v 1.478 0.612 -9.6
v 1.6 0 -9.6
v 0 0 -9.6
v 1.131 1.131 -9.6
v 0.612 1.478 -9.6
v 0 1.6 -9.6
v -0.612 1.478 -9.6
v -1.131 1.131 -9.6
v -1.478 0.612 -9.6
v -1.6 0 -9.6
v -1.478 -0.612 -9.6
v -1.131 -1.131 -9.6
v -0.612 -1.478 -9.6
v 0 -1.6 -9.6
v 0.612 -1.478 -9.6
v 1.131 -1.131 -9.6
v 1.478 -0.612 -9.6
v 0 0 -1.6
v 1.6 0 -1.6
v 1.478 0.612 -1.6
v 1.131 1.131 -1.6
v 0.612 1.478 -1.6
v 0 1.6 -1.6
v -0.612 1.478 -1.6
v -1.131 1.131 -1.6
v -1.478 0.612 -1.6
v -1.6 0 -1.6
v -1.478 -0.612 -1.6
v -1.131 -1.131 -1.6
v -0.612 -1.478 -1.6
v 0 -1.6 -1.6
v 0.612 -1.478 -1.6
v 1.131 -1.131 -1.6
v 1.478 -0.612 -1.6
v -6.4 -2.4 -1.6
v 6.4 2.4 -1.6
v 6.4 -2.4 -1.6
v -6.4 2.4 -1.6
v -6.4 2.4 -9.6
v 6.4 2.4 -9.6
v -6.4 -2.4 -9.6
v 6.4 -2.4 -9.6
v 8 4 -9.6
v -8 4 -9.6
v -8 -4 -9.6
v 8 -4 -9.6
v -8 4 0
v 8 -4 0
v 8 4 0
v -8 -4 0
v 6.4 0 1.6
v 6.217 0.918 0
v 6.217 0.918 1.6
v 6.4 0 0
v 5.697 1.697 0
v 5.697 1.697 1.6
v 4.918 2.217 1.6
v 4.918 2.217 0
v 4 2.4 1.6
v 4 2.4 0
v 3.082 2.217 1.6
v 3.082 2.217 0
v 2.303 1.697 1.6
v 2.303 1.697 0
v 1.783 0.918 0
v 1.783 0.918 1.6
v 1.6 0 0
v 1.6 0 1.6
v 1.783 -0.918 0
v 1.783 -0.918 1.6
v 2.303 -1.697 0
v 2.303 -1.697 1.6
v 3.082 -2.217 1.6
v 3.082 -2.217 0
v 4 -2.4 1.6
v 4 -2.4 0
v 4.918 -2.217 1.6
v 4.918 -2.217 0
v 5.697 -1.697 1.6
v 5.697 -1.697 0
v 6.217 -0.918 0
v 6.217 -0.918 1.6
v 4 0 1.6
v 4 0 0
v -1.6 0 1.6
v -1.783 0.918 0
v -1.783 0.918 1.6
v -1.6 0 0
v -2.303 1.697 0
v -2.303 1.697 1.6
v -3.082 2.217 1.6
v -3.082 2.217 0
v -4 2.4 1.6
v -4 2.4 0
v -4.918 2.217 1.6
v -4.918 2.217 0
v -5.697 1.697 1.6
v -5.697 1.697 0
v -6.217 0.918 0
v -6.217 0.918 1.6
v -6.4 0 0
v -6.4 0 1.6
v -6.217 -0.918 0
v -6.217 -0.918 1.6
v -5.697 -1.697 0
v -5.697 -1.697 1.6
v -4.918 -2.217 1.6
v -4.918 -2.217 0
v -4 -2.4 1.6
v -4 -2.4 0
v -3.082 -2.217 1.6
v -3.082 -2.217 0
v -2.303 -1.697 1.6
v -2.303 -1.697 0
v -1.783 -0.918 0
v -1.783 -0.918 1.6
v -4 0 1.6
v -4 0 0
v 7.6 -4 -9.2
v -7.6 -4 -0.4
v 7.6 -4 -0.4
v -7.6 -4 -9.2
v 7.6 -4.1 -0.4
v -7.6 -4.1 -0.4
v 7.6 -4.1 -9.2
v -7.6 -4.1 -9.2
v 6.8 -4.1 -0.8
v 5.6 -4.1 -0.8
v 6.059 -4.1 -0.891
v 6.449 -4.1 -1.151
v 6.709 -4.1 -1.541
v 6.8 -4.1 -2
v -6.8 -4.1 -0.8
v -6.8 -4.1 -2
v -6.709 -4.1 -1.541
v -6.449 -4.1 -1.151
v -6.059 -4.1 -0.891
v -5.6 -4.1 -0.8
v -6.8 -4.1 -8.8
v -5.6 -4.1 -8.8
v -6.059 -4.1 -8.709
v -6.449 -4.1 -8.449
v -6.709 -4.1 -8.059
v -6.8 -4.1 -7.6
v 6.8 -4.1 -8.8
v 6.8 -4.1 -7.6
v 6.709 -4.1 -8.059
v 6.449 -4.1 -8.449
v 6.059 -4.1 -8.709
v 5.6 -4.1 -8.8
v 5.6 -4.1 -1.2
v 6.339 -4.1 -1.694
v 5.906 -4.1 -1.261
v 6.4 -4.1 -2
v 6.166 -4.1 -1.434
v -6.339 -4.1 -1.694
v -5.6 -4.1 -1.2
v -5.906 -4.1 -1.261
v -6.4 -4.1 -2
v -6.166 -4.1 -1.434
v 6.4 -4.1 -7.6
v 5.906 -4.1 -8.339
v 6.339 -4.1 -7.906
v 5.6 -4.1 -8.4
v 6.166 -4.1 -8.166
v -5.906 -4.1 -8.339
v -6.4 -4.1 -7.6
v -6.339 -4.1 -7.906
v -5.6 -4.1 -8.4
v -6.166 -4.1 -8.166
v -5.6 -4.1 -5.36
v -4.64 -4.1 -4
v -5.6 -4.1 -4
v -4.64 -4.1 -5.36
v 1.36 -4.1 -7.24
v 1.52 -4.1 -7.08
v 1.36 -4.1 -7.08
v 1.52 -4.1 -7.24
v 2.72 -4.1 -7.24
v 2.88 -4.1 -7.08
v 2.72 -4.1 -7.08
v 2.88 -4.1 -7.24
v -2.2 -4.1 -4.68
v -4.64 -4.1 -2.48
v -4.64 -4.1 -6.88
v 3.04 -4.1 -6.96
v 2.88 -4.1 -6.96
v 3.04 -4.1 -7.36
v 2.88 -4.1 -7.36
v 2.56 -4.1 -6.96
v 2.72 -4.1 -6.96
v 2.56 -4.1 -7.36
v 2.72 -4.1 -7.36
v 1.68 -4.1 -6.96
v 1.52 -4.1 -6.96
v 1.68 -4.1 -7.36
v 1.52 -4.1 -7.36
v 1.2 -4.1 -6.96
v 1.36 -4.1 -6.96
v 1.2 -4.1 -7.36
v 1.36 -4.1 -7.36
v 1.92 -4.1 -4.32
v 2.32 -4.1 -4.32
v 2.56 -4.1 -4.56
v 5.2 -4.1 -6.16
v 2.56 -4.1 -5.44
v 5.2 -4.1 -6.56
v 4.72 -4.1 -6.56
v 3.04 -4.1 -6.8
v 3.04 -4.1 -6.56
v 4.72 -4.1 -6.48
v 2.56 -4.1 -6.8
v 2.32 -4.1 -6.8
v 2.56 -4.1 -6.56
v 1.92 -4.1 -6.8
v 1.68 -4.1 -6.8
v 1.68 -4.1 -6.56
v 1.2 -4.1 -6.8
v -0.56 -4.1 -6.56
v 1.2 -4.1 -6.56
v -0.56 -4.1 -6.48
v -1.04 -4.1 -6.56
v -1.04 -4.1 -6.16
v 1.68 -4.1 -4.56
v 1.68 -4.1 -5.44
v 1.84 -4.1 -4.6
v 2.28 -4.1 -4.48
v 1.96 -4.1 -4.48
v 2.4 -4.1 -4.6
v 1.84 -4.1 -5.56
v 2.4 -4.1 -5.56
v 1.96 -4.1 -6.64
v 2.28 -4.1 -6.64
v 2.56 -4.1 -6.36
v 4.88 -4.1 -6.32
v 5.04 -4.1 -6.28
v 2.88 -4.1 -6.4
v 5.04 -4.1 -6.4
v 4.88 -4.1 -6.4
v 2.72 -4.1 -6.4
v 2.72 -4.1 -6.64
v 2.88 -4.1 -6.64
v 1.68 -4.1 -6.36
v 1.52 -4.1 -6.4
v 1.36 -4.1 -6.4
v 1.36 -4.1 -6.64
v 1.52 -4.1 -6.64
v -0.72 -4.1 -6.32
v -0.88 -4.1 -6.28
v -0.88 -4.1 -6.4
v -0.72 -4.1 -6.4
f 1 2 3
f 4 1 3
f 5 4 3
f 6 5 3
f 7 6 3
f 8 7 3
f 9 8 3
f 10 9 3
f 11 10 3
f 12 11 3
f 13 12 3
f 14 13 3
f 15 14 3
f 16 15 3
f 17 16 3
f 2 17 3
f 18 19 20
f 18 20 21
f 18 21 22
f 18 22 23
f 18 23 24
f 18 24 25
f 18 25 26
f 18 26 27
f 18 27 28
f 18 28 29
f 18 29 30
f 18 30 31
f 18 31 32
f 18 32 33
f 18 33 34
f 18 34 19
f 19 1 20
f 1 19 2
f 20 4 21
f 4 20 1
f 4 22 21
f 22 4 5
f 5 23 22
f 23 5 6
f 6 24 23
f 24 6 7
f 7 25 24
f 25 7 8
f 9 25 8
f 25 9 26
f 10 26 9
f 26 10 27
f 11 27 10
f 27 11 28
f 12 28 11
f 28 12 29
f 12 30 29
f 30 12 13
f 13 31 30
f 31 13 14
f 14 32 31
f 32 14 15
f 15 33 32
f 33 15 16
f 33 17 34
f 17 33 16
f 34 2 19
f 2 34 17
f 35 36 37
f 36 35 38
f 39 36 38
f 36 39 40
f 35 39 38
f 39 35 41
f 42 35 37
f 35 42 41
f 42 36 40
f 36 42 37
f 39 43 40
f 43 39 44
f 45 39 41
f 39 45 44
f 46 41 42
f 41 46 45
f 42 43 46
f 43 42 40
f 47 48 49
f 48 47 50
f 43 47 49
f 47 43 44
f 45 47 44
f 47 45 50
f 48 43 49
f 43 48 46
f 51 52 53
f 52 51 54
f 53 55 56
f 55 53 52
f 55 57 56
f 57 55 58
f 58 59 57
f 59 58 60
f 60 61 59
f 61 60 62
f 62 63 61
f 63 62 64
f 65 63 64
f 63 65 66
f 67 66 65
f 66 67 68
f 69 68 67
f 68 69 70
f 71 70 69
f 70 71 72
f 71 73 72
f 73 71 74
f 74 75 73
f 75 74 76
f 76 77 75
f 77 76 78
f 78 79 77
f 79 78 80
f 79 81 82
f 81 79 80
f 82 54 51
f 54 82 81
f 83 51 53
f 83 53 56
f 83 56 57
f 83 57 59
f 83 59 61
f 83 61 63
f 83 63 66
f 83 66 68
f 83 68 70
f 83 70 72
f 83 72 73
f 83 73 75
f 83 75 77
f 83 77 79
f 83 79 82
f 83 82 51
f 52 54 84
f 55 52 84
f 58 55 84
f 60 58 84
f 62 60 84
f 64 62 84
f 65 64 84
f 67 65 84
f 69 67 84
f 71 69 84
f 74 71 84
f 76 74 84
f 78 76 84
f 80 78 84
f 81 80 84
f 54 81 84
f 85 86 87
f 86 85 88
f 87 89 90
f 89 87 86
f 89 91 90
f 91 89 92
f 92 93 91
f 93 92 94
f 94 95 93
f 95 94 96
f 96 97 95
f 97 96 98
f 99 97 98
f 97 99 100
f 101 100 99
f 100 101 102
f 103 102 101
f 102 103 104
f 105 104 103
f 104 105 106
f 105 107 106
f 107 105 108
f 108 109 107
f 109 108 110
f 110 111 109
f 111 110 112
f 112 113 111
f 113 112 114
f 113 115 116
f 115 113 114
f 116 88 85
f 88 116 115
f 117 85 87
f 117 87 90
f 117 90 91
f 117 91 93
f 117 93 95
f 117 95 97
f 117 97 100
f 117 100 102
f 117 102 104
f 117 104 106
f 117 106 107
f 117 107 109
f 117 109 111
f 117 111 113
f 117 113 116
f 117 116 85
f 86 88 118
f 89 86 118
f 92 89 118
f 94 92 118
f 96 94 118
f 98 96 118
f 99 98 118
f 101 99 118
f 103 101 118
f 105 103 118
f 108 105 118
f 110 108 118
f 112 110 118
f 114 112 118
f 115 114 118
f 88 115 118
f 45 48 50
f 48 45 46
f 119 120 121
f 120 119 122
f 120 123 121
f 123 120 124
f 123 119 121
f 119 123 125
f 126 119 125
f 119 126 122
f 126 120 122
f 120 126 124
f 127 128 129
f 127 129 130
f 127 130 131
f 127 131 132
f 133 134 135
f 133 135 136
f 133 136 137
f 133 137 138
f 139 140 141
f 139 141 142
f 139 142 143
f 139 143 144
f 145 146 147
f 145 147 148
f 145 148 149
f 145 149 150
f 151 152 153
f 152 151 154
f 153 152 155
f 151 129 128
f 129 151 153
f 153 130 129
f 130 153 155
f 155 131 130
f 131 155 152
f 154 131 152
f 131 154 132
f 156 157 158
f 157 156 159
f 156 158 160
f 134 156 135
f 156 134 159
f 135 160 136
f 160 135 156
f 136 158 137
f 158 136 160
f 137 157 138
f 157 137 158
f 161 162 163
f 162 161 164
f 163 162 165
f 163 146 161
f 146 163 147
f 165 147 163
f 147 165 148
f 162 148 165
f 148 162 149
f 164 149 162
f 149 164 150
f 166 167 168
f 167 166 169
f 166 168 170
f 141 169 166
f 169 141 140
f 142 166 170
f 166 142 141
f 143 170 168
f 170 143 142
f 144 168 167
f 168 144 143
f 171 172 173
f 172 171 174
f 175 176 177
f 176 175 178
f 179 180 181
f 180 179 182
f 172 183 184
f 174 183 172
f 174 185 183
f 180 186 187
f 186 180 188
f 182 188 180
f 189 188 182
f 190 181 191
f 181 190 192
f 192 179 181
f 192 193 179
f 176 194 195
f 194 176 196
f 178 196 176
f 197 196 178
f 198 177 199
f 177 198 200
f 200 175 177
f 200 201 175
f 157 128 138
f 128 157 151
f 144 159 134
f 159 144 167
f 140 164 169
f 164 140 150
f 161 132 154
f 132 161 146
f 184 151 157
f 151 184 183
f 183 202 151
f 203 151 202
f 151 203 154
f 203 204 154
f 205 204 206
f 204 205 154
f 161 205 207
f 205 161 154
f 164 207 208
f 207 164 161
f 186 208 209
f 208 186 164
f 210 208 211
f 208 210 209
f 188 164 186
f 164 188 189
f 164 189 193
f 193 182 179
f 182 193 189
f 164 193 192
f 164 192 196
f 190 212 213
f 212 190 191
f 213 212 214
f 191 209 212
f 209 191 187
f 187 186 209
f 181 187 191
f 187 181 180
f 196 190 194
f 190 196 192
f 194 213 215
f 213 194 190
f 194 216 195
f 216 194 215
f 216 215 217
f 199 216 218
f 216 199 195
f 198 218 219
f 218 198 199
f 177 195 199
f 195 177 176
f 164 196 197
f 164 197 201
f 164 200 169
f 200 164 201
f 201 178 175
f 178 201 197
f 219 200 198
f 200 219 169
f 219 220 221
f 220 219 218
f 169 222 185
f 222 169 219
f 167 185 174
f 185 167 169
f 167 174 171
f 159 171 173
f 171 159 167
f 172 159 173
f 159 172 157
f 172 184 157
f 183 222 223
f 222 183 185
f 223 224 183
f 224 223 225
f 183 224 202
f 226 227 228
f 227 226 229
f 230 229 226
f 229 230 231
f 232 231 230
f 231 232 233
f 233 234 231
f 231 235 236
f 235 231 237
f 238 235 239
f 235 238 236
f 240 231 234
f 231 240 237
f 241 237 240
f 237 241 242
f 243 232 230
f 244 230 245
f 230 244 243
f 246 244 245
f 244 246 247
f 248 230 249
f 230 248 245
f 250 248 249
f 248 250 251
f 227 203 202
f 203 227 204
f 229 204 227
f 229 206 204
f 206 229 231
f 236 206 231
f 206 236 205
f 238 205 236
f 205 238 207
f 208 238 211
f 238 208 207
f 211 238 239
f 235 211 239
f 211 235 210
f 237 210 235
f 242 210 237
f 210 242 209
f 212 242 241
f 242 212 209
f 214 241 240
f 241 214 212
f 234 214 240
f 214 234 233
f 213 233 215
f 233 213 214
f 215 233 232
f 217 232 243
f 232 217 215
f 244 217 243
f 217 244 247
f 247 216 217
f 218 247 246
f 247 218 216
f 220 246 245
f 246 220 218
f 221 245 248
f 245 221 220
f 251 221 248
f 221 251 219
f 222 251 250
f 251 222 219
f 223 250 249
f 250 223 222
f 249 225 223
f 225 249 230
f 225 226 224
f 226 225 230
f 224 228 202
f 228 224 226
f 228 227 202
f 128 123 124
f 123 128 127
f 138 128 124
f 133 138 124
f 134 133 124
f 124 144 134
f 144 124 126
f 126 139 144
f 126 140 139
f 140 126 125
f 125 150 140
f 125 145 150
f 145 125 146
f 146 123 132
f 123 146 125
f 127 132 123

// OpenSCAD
// file: ../p/4-4edge.scad
use <../lib.scad>
function ldraw_lib__4_4edge() = [
// 0 Circle 1.0
// 0 Name: 4-4edge.dat
// 0 Author: James Jessiman
// 0 !LDRAW_ORG Primitive UPDATE 2017-01
// 0 !LICENSE Licensed under CC BY 2.0 and CC BY 4.0 : see CAreadme.txt
// 
// 0 BFC CERTIFY CCW
  [0,"BFC","CERTIFY"],
  [0,"BFC","CCW"],
// 
// 0 !HISTORY 1998-12-15 [PTadmin] Official Update 1998-10
// 0 !HISTORY 2005-12-28 [PTadmin] Official Update 2005-01
// 0 !HISTORY 2007-06-24 [PTadmin] Header formatted for Contributor Agreement
// 0 !HISTORY 2008-07-01 [PTadmin] Official Update 2008-01
// 0 !HISTORY 2017-01-15 [Steffen] BFCed
// 0 !HISTORY 2017-12-30 [PTadmin] Official Update 2017-01
// 
// 
// 2 24 1 0 0 0.9239 0 0.3827
  [2,24,1,0,0,0.9239,0,0.3827],
// 2 24 0.9239 0 0.3827 0.7071 0 0.7071
  [2,24,0.9239,0,0.3827,0.7071,0,0.7071],
// 2 24 0.7071 0 0.7071 0.3827 0 0.9239
  [2,24,0.7071,0,0.7071,0.3827,0,0.9239],
// 2 24 0.3827 0 0.9239 0 0 1
  [2,24,0.3827,0,0.9239,0,0,1],
// 2 24 0 0 1 -0.3827 0 0.9239
  [2,24,0,0,1,-0.3827,0,0.9239],
// 2 24 -0.3827 0 0.9239 -0.7071 0 0.7071
  [2,24,-0.3827,0,0.9239,-0.7071,0,0.7071],
// 2 24 -0.7071 0 0.7071 -0.9239 0 0.3827
  [2,24,-0.7071,0,0.7071,-0.9239,0,0.3827],
// 2 24 -0.9239 0 0.3827 -1 0 -0
  [2,24,-0.9239,0,0.3827,-1,0,-0],
// 2 24 -1 0 -0 -0.9239 0 -0.3827
  [2,24,-1,0,-0,-0.9239,0,-0.3827],
// 2 24 -0.9239 0 -0.3827 -0.7071 0 -0.7071
  [2,24,-0.9239,0,-0.3827,-0.7071,0,-0.7071],
// 2 24 -0.7071 0 -0.7071 -0.3827 0 -0.9239
  [2,24,-0.7071,0,-0.7071,-0.3827,0,-0.9239],
// 2 24 -0.3827 0 -0.9239 0 0 -1
  [2,24,-0.3827,0,-0.9239,0,0,-1],
// 2 24 0 0 -1 0.3827 0 -0.9239
  [2,24,0,0,-1,0.3827,0,-0.9239],
// 2 24 0.3827 0 -0.9239 0.7071 0 -0.7071
  [2,24,0.3827,0,-0.9239,0.7071,0,-0.7071],
// 2 24 0.7071 0 -0.7071 0.9239 0 -0.3827
  [2,24,0.7071,0,-0.7071,0.9239,0,-0.3827],
// 2 24 0.9239 0 -0.3827 1 0 0
  [2,24,0.9239,0,-0.3827,1,0,0],
];
module ldraw_lib__4_4edge(step=0, col=false, unit=2/5, alt=false, line=0.2, solid=!$preview)
    makepoly(ldraw_lib__4_4edge(), step=step, col=col, unit=unit, alt=alt, line=line, solid=solid);
ldraw_lib__4_4edge(line=0.2);
// file: ../p/4-4disc.scad
use <../lib.scad>
function ldraw_lib__4_4disc() = [
// 0 Disc 1.0
// 0 Name: 4-4disc.dat
// 0 Author: James Jessiman
// 0 !LDRAW_ORG Primitive UPDATE 2002-02
// 0 !LICENSE Licensed under CC BY 2.0 and CC BY 4.0 : see CAreadme.txt
// 
// 0 BFC CERTIFY CCW
  [0,"BFC","CERTIFY"],
  [0,"BFC","CCW"],
// 
// 0 !HISTORY 1998-12-15 [PTadmin] Official Update 1998-10
// 0 !HISTORY 2002-03-23 [sbliss] Added BFC statement
// 0 !HISTORY 2002-04-25 [PTadmin] Official Update 2002-02
// 0 !HISTORY 2007-06-24 [PTadmin] Header formatted for Contributor Agreement
// 0 !HISTORY 2008-07-01 [PTadmin] Official Update 2008-01
// 
// 
// 3 16 0 0 0 1 0 0 0.9239 0 0.3827
  [3,16,0,0,0,1,0,0,0.9239,0,0.3827],
// 3 16 0 0 0 0.9239 0 0.3827 0.7071 0 0.7071
  [3,16,0,0,0,0.9239,0,0.3827,0.7071,0,0.7071],
// 3 16 0 0 0 0.7071 0 0.7071 0.3827 0 0.9239
  [3,16,0,0,0,0.7071,0,0.7071,0.3827,0,0.9239],
// 3 16 0 0 0 0.3827 0 0.9239 0 0 1
  [3,16,0,0,0,0.3827,0,0.9239,0,0,1],
// 3 16 0 0 0 0 0 1 -0.3827 0 0.9239
  [3,16,0,0,0,0,0,1,-0.3827,0,0.9239],
// 3 16 0 0 0 -0.3827 0 0.9239 -0.7071 0 0.7071
  [3,16,0,0,0,-0.3827,0,0.9239,-0.7071,0,0.7071],
// 3 16 0 0 0 -0.7071 0 0.7071 -0.9239 0 0.3827
  [3,16,0,0,0,-0.7071,0,0.7071,-0.9239,0,0.3827],
// 3 16 0 0 0 -0.9239 0 0.3827 -1 0 -0
  [3,16,0,0,0,-0.9239,0,0.3827,-1,0,-0],
// 3 16 0 0 0 -1 0 -0 -0.9239 0 -0.3827
  [3,16,0,0,0,-1,0,-0,-0.9239,0,-0.3827],
// 3 16 0 0 0 -0.9239 0 -0.3827 -0.7071 0 -0.7071
  [3,16,0,0,0,-0.9239,0,-0.3827,-0.7071,0,-0.7071],
// 3 16 0 0 0 -0.7071 0 -0.7071 -0.3827 0 -0.9239
  [3,16,0,0,0,-0.7071,0,-0.7071,-0.3827,0,-0.9239],
// 3 16 0 0 0 -0.3827 0 -0.9239 0 0 -1
  [3,16,0,0,0,-0.3827,0,-0.9239,0,0,-1],
// 3 16 0 0 0 0 0 -1 0.3827 0 -0.9239
  [3,16,0,0,0,0,0,-1,0.3827,0,-0.9239],
// 3 16 0 0 0 0.3827 0 -0.9239 0.7071 0 -0.7071
  [3,16,0,0,0,0.3827,0,-0.9239,0.7071,0,-0.7071],
// 3 16 0 0 0 0.7071 0 -0.7071 0.9239 0 -0.3827
  [3,16,0,0,0,0.7071,0,-0.7071,0.9239,0,-0.3827],
// 3 16 0 0 0 0.9239 0 -0.3827 1 0 0
  [3,16,0,0,0,0.9239,0,-0.3827,1,0,0],
// 0
];
module ldraw_lib__4_4disc(step=0, col=false, unit=2/5, alt=false, line=0.2, solid=!$preview)
    makepoly(ldraw_lib__4_4disc(), step=step, col=col, unit=unit, alt=alt, line=line, solid=solid);
ldraw_lib__4_4disc(line=0.2);
// file: ../p/4-4cyli.scad
use <../lib.scad>
$fa=1; $fs=0.2;
function ldraw_lib__4_4cyli(realsolid=false) = [
// 0 Cylinder 1.0
// 0 Name: 4-4cyli.dat
// 0 Author: James Jessiman
// 0 !LDRAW_ORG Primitive UPDATE 2005-01
// 0 !LICENSE Licensed under CC BY 2.0 and CC BY 4.0 : see CAreadme.txt
// 
// 0 BFC CERTIFY CCW
  [0,"BFC","CERTIFY"],
  [0,"BFC","CCW"],
// 
// 0 !HISTORY 1998-12-15 [PTadmin] Official Update 1998-10
// 0 !HISTORY 2002-03-23 [sbliss] Added BFC statement; merged headers from files in distributions LDraw 0.27 and Complete.
// 0 !HISTORY 2002-04-25 [PTadmin] Official Update 2002-02
// 0 !HISTORY 2004-12-14 [guyvivan] BFC CCW
// 0 !HISTORY 2005-12-28 [PTadmin] Official Update 2005-01
// 0 !HISTORY 2007-06-24 [PTadmin] Header formatted for Contributor Agreement
// 0 !HISTORY 2008-07-01 [PTadmin] Official Update 2008-01
// 
// 
// 4 16 1 1 0 0.9239 1 0.3827 0.9239 0 0.3827 1 0 0
  [4,16,1,1,0,0.9239,1,0.3827,0.9239,0,0.3827,1,0,0],
// 5 24 1 0 0 1 1 0 0.9239 0 0.3827 0.9239 0 -0.3827
  [5,24,1,0,0,1,1,0,0.9239,0,0.3827,0.9239,0,-0.3827],
// 4 16 0.9239 1 0.3827 0.7071 1 0.7071 0.7071 0 0.7071 0.9239 0 0.3827
  [4,16,0.9239,1,0.3827,0.7071,1,0.7071,0.7071,0,0.7071,0.9239,0,0.3827],
// 5 24 0.9239 0 0.3827 0.9239 1 0.3827 0.7071 0 0.7071 1 0 0
  [5,24,0.9239,0,0.3827,0.9239,1,0.3827,0.7071,0,0.7071,1,0,0],
// 4 16 0.7071 1 0.7071 0.3827 1 0.9239 0.3827 0 0.9239 0.7071 0 0.7071
  [4,16,0.7071,1,0.7071,0.3827,1,0.9239,0.3827,0,0.9239,0.7071,0,0.7071],
// 5 24 0.7071 0 0.7071 0.7071 1 0.7071 0.3827 0 0.9239 0.9239 0 0.3827
  [5,24,0.7071,0,0.7071,0.7071,1,0.7071,0.3827,0,0.9239,0.9239,0,0.3827],
// 4 16 0.3827 1 0.9239 0 1 1 0 0 1 0.3827 0 0.9239
  [4,16,0.3827,1,0.9239,0,1,1,0,0,1,0.3827,0,0.9239],
// 5 24 0.3827 0 0.9239 0.3827 1 0.9239 0 0 1 0.7071 0 0.7071
  [5,24,0.3827,0,0.9239,0.3827,1,0.9239,0,0,1,0.7071,0,0.7071],
// 4 16 0 1 1 -0.3827 1 0.9239 -0.3827 0 0.9239 0 0 1
  [4,16,0,1,1,-0.3827,1,0.9239,-0.3827,0,0.9239,0,0,1],
// 5 24 0 0 1 0 1 1 -0.3827 0 0.9239 0.3827 0 0.9239
  [5,24,0,0,1,0,1,1,-0.3827,0,0.9239,0.3827,0,0.9239],
// 4 16 -0.3827 1 0.9239 -0.7071 1 0.7071 -0.7071 0 0.7071 -0.3827 0 0.9239
  [4,16,-0.3827,1,0.9239,-0.7071,1,0.7071,-0.7071,0,0.7071,-0.3827,0,0.9239],
// 5 24 -0.3827 0 0.9239 -0.3827 1 0.9239 -0.7071 0 0.7071 0 0 1
  [5,24,-0.3827,0,0.9239,-0.3827,1,0.9239,-0.7071,0,0.7071,0,0,1],
// 4 16 -0.7071 1 0.7071 -0.9239 1 0.3827 -0.9239 0 0.3827 -0.7071 0 0.7071
  [4,16,-0.7071,1,0.7071,-0.9239,1,0.3827,-0.9239,0,0.3827,-0.7071,0,0.7071],
// 5 24 -0.7071 0 0.7071 -0.7071 1 0.7071 -0.9239 0 0.3827 -0.3827 0 0.9239
  [5,24,-0.7071,0,0.7071,-0.7071,1,0.7071,-0.9239,0,0.3827,-0.3827,0,0.9239],
// 4 16 -0.9239 1 0.3827 -1 1 0 -1 0 0 -0.9239 0 0.3827
  [4,16,-0.9239,1,0.3827,-1,1,0,-1,0,0,-0.9239,0,0.3827],
// 5 24 -0.9239 0 0.3827 -0.9239 1 0.3827 -1 0 0 -0.7071 0 0.7071
  [5,24,-0.9239,0,0.3827,-0.9239,1,0.3827,-1,0,0,-0.7071,0,0.7071],
// 4 16 -1 1 0 -0.9239 1 -0.3827 -0.9239 0 -0.3827 -1 0 0
  [4,16,-1,1,0,-0.9239,1,-0.3827,-0.9239,0,-0.3827,-1,0,0],
// 5 24 -1 0 0 -1 1 0 -0.9239 0 -0.3827 -0.9239 0 0.3827
  [5,24,-1,0,0,-1,1,0,-0.9239,0,-0.3827,-0.9239,0,0.3827],
// 4 16 -0.9239 1 -0.3827 -0.7071 1 -0.7071 -0.7071 0 -0.7071 -0.9239 0 -0.3827
  [4,16,-0.9239,1,-0.3827,-0.7071,1,-0.7071,-0.7071,0,-0.7071,-0.9239,0,-0.3827],
// 5 24 -0.9239 0 -0.3827 -0.9239 1 -0.3827 -0.7071 0 -0.7071 -1 0 0
  [5,24,-0.9239,0,-0.3827,-0.9239,1,-0.3827,-0.7071,0,-0.7071,-1,0,0],
// 4 16 -0.7071 1 -0.7071 -0.3827 1 -0.9239 -0.3827 0 -0.9239 -0.7071 0 -0.7071
  [4,16,-0.7071,1,-0.7071,-0.3827,1,-0.9239,-0.3827,0,-0.9239,-0.7071,0,-0.7071],
// 5 24 -0.7071 0 -0.7071 -0.7071 1 -0.7071 -0.3827 0 -0.9239 -0.9239 0 -0.3827
  [5,24,-0.7071,0,-0.7071,-0.7071,1,-0.7071,-0.3827,0,-0.9239,-0.9239,0,-0.3827],
// 4 16 -0.3827 1 -0.9239 0 1 -1 0 0 -1 -0.3827 0 -0.9239
  [4,16,-0.3827,1,-0.9239,0,1,-1,0,0,-1,-0.3827,0,-0.9239],
// 5 24 -0.3827 0 -0.9239 -0.3827 1 -0.9239 0 0 -1 -0.7071 0 -0.7071
  [5,24,-0.3827,0,-0.9239,-0.3827,1,-0.9239,0,0,-1,-0.7071,0,-0.7071],
// 4 16 0 1 -1 0.3827 1 -0.9239 0.3827 0 -0.9239 0 0 -1
  [4,16,0,1,-1,0.3827,1,-0.9239,0.3827,0,-0.9239,0,0,-1],
// 5 24 0 0 -1 0 1 -1 0.3827 0 -0.9239 -0.3827 0 -0.9239
  [5,24,0,0,-1,0,1,-1,0.3827,0,-0.9239,-0.3827,0,-0.9239],
// 4 16 0.3827 1 -0.9239 0.7071 1 -0.7071 0.7071 0 -0.7071 0.3827 0 -0.9239
  [4,16,0.3827,1,-0.9239,0.7071,1,-0.7071,0.7071,0,-0.7071,0.3827,0,-0.9239],
// 5 24 0.3827 0 -0.9239 0.3827 1 -0.9239 0.7071 0 -0.7071 0 0 -1
  [5,24,0.3827,0,-0.9239,0.3827,1,-0.9239,0.7071,0,-0.7071,0,0,-1],
// 4 16 0.7071 1 -0.7071 0.9239 1 -0.3827 0.9239 0 -0.3827 0.7071 0 -0.7071
  [4,16,0.7071,1,-0.7071,0.9239,1,-0.3827,0.9239,0,-0.3827,0.7071,0,-0.7071],
// 5 24 0.7071 0 -0.7071 0.7071 1 -0.7071 0.9239 0 -0.3827 0.3827 0 -0.9239
  [5,24,0.7071,0,-0.7071,0.7071,1,-0.7071,0.9239,0,-0.3827,0.3827,0,-0.9239],
// 4 16 0.9239 1 -0.3827 1 1 0 1 0 0 0.9239 0 -0.3827
  [4,16,0.9239,1,-0.3827,1,1,0,1,0,0,0.9239,0,-0.3827],
// 5 24 0.9239 0 -0.3827 0.9239 1 -0.3827 1 0 0 0.7071 0 -0.7071
  [5,24,0.9239,0,-0.3827,0.9239,1,-0.3827,1,0,0,0.7071,0,-0.7071],
// 0
];
module ldraw_lib__4_4cyli(step=0, col=false, unit=2/5, alt=false, line=0.2, solid=!$preview)
    makepoly(ldraw_lib__4_4cyli(solid), step=step, col=col, unit=unit, alt=alt, line=line, solid=solid);
ldraw_lib__4_4cyli(line=0.2);
// file: ../p/stud3.scad
use <../lib.scad>
use <4-4cyli.scad>
use <4-4disc.scad>
use <4-4edge.scad>
function ldraw_lib__stud3() = [
// 0 Stud Tube Solid
// 0 Name: stud3.dat
// 0 Author: James Jessiman
// 0 !LDRAW_ORG Primitive UPDATE 2012-01
// 0 !LICENSE Licensed under CC BY 4.0 : see CAreadme.txt
// 
// 0 BFC CERTIFY CCW
  [0,"BFC","CERTIFY"],
  [0,"BFC","CCW"],
// 
// 0 !HISTORY 2002-04-04 [sbliss] Modified for BFC compliance
// 0 !HISTORY 2002-04-25 [PTadmin] Official Update 2002-02
// 0 !HISTORY 2007-06-24 [PTadmin] Header formatted for Contributor Agreement
// 0 !HISTORY 2008-07-01 [PTadmin] Official Update 2008-01
// 0 !HISTORY 2012-02-16 [Philo] Changed to CCW
// 0 !HISTORY 2012-03-30 [PTadmin] Official Update 2012-01
// 
// 
// 1 16 0 -4 0 4 0 0 0 1 0 0 0 4 4-4edge.dat
  [1,16,0,-4,0,4,0,0,0,1,0,0,0,4, ldraw_lib__4_4edge()],
// 1 16 0 0 0 4 0 0 0 1 0 0 0 4 4-4edge.dat
  [1,16,0,0,0,4,0,0,0,1,0,0,0,4, ldraw_lib__4_4edge()],
// 1 16 0 -4 0 4 0 0 0 1 0 0 0 4 4-4disc.dat
  [1,16,0,-4,0,4,0,0,0,1,0,0,0,4, ldraw_lib__4_4disc()],
  [-1,16,0,0,0,4,0,0,0,-1,0,0,0,4, ldraw_lib__4_4disc()],
// 1 16 0 -4 0 4 0 0 0 4 0 0 0 4 4-4cyli.dat
  [1,16,0,-4,0,4,0,0,0,4,0,0,0,4, ldraw_lib__4_4cyli()],
];
module ldraw_lib__stud3(step=0, col=false, unit=2/5, alt=false, line=0.2, solid=!$preview)
    makepoly(ldraw_lib__stud3(), step=step, col=col, unit=unit, alt=alt, line=line, solid=solid);
ldraw_lib__stud3(line=0.2);
// file: ../p/stud.scad
use <../lib.scad>
use <4-4cyli.scad>
use <4-4disc.scad>
use <4-4edge.scad>
function ldraw_lib__stud() = [
// 0 Stud
// 0 Name: stud.dat
// 0 Author: James Jessiman
// 0 !LDRAW_ORG Primitive UPDATE 2012-01
// 0 !LICENSE Licensed under CC BY 4.0 : see CAreadme.txt
// 
// 0 BFC CERTIFY CCW
  [0,"BFC","CERTIFY"],
  [0,"BFC","CCW"],
// 
// 0 !HISTORY 2002-04-04 [sbliss] Modified for BFC compliance
// 0 !HISTORY 2002-04-25 [PTadmin] Official Update 2002-02
// 0 !HISTORY 2007-06-24 [PTadmin] Header formatted for Contributor Agreement
// 0 !HISTORY 2008-07-01 [PTadmin] Official Update 2008-01
// 0 !HISTORY 2012-02-16 [Philo] Changed to CCW
// 0 !HISTORY 2012-03-30 [PTadmin] Official Update 2012-01
// 
// 
// 1 16 0 0 0 6 0 0 0 1 0 0 0 6 4-4edge.dat
  [1,16,0,0,0,6,0,0,0,1,0,0,0,6, ldraw_lib__4_4edge()],
// 1 16 0 -4 0 6 0 0 0 1 0 0 0 6 4-4edge.dat
  [1,16,0,-4,0,6,0,0,0,1,0,0,0,6, ldraw_lib__4_4edge()],
// 1 16 0 0 0 6 0 0 0 -4 0 0 0 6 4-4cyli.dat
  [1,16,0,0,0,6,0,0,0,-4,0,0,0,6, ldraw_lib__4_4cyli()],
// 1 16 0 -4 0 6 0 0 0 1 0 0 0 6 4-4disc.dat
  [1,16,0,-4,0,6,0,0,0,1,0,0,0,6, ldraw_lib__4_4disc()],
  [-1,16,0,0,0,6,0,0,0,-1,0,0,0,6, ldraw_lib__4_4disc()],
];
module ldraw_lib__stud(step=0, col=false, unit=2/5, alt=false, line=0.2, solid=!$preview)
    makepoly(ldraw_lib__stud(), step=step, col=col, unit=unit, alt=alt, line=line, solid=solid);
ldraw_lib__stud(line=0.2);
// file: ../p/box5.scad
use <../lib.scad>
function ldraw_lib__box5() = [
// 0 Box with 5 Faces and All Edges
// 0 Name: box5.dat
// 0 Author: James Jessiman
// 0 !LDRAW_ORG Primitive UPDATE 2012-01
// 0 !LICENSE Licensed under CC BY 2.0 and CC BY 4.0 : see CAreadme.txt
// 
// 0 BFC CERTIFY CCW
  [0,"BFC","CERTIFY"],
  [0,"BFC","CCW"],
// 
// 0 !HISTORY 2002-04-03 [sbliss] Modified for BFC compliance
// 0 !HISTORY 2002-04-25 [PTadmin] Official Update 2002-02
// 0 !HISTORY 2007-06-24 [PTadmin] Header formatted for Contributor Agreement
// 0 !HISTORY 2008-07-01 [PTadmin] Official Update 2008-01
// 0 !HISTORY 2012-02-16 [Philo] Changed to CCW
// 0 !HISTORY 2012-03-30 [PTadmin] Official Update 2012-01
// 
// 
// 2 24 1 1 1 -1 1 1
  [2,24,1,1,1,-1,1,1],
// 2 24 -1 1 1 -1 1 -1
  [2,24,-1,1,1,-1,1,-1],
// 2 24 -1 1 -1 1 1 -1
  [2,24,-1,1,-1,1,1,-1],
// 2 24 1 1 -1 1 1 1
  [2,24,1,1,-1,1,1,1],
// 2 24 1 0 1 -1 0 1
  [2,24,1,0,1,-1,0,1],
// 2 24 -1 0 1 -1 0 -1
  [2,24,-1,0,1,-1,0,-1],
// 2 24 -1 0 -1 1 0 -1
  [2,24,-1,0,-1,1,0,-1],
// 2 24 1 0 -1 1 0 1
  [2,24,1,0,-1,1,0,1],
// 2 24 1 0 1 1 1 1
  [2,24,1,0,1,1,1,1],
// 2 24 -1 0 1 -1 1 1
  [2,24,-1,0,1,-1,1,1],
// 2 24 1 0 -1 1 1 -1
  [2,24,1,0,-1,1,1,-1],
// 2 24 -1 0 -1 -1 1 -1
  [2,24,-1,0,-1,-1,1,-1],
// 4 16 -1 1 1 1 1 1 1 1 -1 -1 1 -1
  [4,16,-1,1,1,1,1,1,1,1,-1,-1,1,-1],
// 4 16 -1 1 1 -1 0 1 1 0 1 1 1 1
  [4,16,-1,1,1,-1,0,1,1,0,1,1,1,1],
// 4 16 -1 1 -1 -1 0 -1 -1 0 1 -1 1 1
  [4,16,-1,1,-1,-1,0,-1,-1,0,1,-1,1,1],
// 4 16 1 1 -1 1 0 -1 -1 0 -1 -1 1 -1
  [4,16,1,1,-1,1,0,-1,-1,0,-1,-1,1,-1],
// 4 16 1 1 1 1 0 1 1 0 -1 1 1 -1
  [4,16,1,1,1,1,0,1,1,0,-1,1,1,-1],
];
makepoly(ldraw_lib__box5(), line=0.2);
// file: ../p/box4t.scad
use <../lib.scad>
function ldraw_lib__box4t() = [
// 0 Box with 4 Adjacent Faces and All Edges
// 0 Name: box4t.dat
// 0 Author: Tore Eriksson [Tore_Eriksson]
// 0 !LDRAW_ORG Primitive UPDATE 2003-02
// 0 !LICENSE Licensed under CC BY 2.0 and CC BY 4.0 : see CAreadme.txt
// 
// 0 BFC CERTIFY CCW
  [0,"BFC","CERTIFY"],
  [0,"BFC","CCW"],
// 
// 0 !HISTORY 1997-09-29 [PTadmin] Official Update 1997-15
// 0 !HISTORY 2002-08-31 [izanette] Modified with WINDZ for BFC compliance
// 0 !HISTORY 2003-08-01 [PTadmin] Official Update 2003-02
// 0 !HISTORY 2007-06-24 [PTadmin] Header formatted for Contributor Agreement
// 0 !HISTORY 2008-07-01 [PTadmin] Official Update 2008-01
// 
// 
// 2 24 1 1 1 -1 1 1
  [2,24,1,1,1,-1,1,1],
// 2 24 -1 1 1 -1 1 -1
  [2,24,-1,1,1,-1,1,-1],
// 2 24 -1 1 -1 1 1 -1
  [2,24,-1,1,-1,1,1,-1],
// 2 24 1 1 -1 1 1 1
  [2,24,1,1,-1,1,1,1],
// 2 24 1 0 1 -1 0 1
  [2,24,1,0,1,-1,0,1],
// 2 24 -1 0 1 -1 0 -1
  [2,24,-1,0,1,-1,0,-1],
// 2 24 -1 0 -1 1 0 -1
  [2,24,-1,0,-1,1,0,-1],
// 2 24 1 0 -1 1 0 1
  [2,24,1,0,-1,1,0,1],
// 2 24 1 0 1 1 1 1
  [2,24,1,0,1,1,1,1],
// 2 24 -1 0 1 -1 1 1
  [2,24,-1,0,1,-1,1,1],
// 2 24 1 0 -1 1 1 -1
  [2,24,1,0,-1,1,1,-1],
// 2 24 -1 0 -1 -1 1 -1
  [2,24,-1,0,-1,-1,1,-1],
// 4 16 1 1 1 1 1 -1 -1 1 -1 -1 1 1
  [4,16,1,1,1,1,1,-1,-1,1,-1,-1,1,1],
// 4 16 1 1 1 -1 1 1 -1 0 1 1 0 1
  [4,16,1,1,1,-1,1,1,-1,0,1,1,0,1],
// 4 16 -1 1 1 -1 1 -1 -1 0 -1 -1 0 1
  [4,16,-1,1,1,-1,1,-1,-1,0,-1,-1,0,1],
// 0 4 16 -1 1 -1 -1 0 -1 1 0 -1 1 1 -1
// 4 16 1 1 -1 1 1 1 1 0 1 1 0 -1
  [4,16,1,1,-1,1,1,1,1,0,1,1,0,-1],
// 0
];
makepoly(ldraw_lib__box4t(), line=0.2);
// file: ../p/box5-12.scad
use <../lib.scad>
function ldraw_lib__box5_12() = [
// 0 Box with 5 Faces without Any Edges
// 0 Name: box5-12.dat
// 0 Author: Chris Dee [cwdee]
// 0 !LDRAW_ORG Primitive UPDATE 2009-02
// 0 !LICENSE Licensed under CC BY 2.0 and CC BY 4.0 : see CAreadme.txt
// 
// 0 BFC CERTIFY CCW
  [0,"BFC","CERTIFY"],
  [0,"BFC","CCW"],
// 
// 0 !HISTORY 2009-09-03 [PTadmin] Official Update 2009-02
// 
// 
// 4 16 1 1 1 1 1 -1 -1 1 -1 -1 1 1
  [4,16,1,1,1,1,1,-1,-1,1,-1,-1,1,1],
// 4 16 -1 0 1 1 0 1 1 1 1 -1 1 1
  [4,16,-1,0,1,1,0,1,1,1,1,-1,1,1],
// 4 16 -1 0 -1 -1 0 1 -1 1 1 -1 1 -1
  [4,16,-1,0,-1,-1,0,1,-1,1,1,-1,1,-1],
// 4 16 1 0 -1 -1 0 -1 -1 1 -1 1 1 -1
  [4,16,1,0,-1,-1,0,-1,-1,1,-1,1,1,-1],
// 4 16 1 0 1 1 0 -1 1 1 -1 1 1 1
  [4,16,1,0,1,1,0,-1,1,1,-1,1,1,1],
// 0
];
module ldraw_lib__box5_12(step=0, col=false, unit=2/5, alt=false, line=0.2, solid=!$preview)
    makepoly(ldraw_lib__box5_12(), step=step, col=col, unit=unit, alt=alt, line=line, solid=solid);
ldraw_lib__box5_12(line=0.2);
// file: ../p/1-4ring2.scad
use <../lib.scad>
$fa=1; $fs=0.2;
function ldraw_lib__1_4ring2(realsolid=false) = [
// 0 Ring  2 x 0.25
// 0 Name: 1-4ring2.dat
// 0 Author: Franklin W. Cain [fwcain]
// 0 !LDRAW_ORG Primitive UPDATE 2015-01
// 0 !LICENSE Licensed under CC BY 2.0 and CC BY 4.0 : see CAreadme.txt
// 
// 0 BFC CERTIFY CCW
  [0,"BFC","CERTIFY"],
  [0,"BFC","CCW"],
// 
// 0 !HISTORY 2001-12-31 [PTadmin] Official Update 2001-03
// 0 !HISTORY 2007-06-22 [PTadmin] Header formatted for Contributor Agreement
// 0 !HISTORY 2008-07-01 [PTadmin] Official Update 2008-01
// 0 !HISTORY 2012-02-16 [Philo] Changed to CCW
// 0 !HISTORY 2012-03-30 [PTadmin] Official Update 2012-01
// 0 !HISTORY 2014-12-25 [MMR1988] Fixed a rounding issue
// 0 !HISTORY 2015-10-11 [PTadmin] Official Update 2015-01
// 
// 
// 4 16 3 0 0 2.7717 0 1.1481 1.8478 0 0.7654 2 0 0
  [4,16,3,0,0,2.7717,0,1.1481,1.8478,0,0.7654,2,0,0],
// 4 16 2.7717 0 1.1481 2.1213 0 2.1213 1.4142 0 1.4142 1.8478 0 0.7654
  [4,16,2.7717,0,1.1481,2.1213,0,2.1213,1.4142,0,1.4142,1.8478,0,0.7654],
// 4 16 2.1213 0 2.1213 1.1481 0 2.7717 0.7654 0 1.8478 1.4142 0 1.4142
  [4,16,2.1213,0,2.1213,1.1481,0,2.7717,0.7654,0,1.8478,1.4142,0,1.4142],
// 4 16 1.1481 0 2.7717 0 0 3 0 0 2 0.7654 0 1.8478
  [4,16,1.1481,0,2.7717,0,0,3,0,0,2,0.7654,0,1.8478],
// 0 // Build by Primitive Generator 2
];
module ldraw_lib__1_4ring2(step=0, col=false, unit=2/5, alt=false, line=0.2, solid=!$preview)
    makepoly(ldraw_lib__1_4ring2(solid), step=step, col=col, unit=unit, alt=alt, line=line, solid=solid);
ldraw_lib__1_4ring2(line=0.2);
// file: ../p/1-4ndis.scad
use <../lib.scad>
function ldraw_lib__1_4ndis() = [
// 0 Disc Negative 0.25
// 0 Name: 1-4ndis.dat
// 0 Author: James Jessiman
// 0 !LDRAW_ORG Primitive UPDATE 2012-01
// 0 !LICENSE Licensed under CC BY 2.0 and CC BY 4.0 : see CAreadme.txt
// 
// 0 BFC CERTIFY CCW
  [0,"BFC","CERTIFY"],
  [0,"BFC","CCW"],
// 
// 0 !HISTORY 2002-03-23 [sbliss] Added BFC Statement
// 0 !HISTORY 2002-04-25 [PTadmin] Official Update 2002-02
// 0 !HISTORY 2007-06-22 [PTadmin] Header formatted for Contributor Agreement
// 0 !HISTORY 2008-07-01 [PTadmin] Official Update 2008-01
// 0 !HISTORY 2012-02-16 [Philo] Changed to CCW
// 0 !HISTORY 2012-03-30 [PTadmin] Official Update 2012-01
// 
// 
// 3 16 0.9239 0 0.3827 1 0 0 1 0 1
  [3,16,0.9239,0,0.3827,1,0,0,1,0,1],
// 3 16 0.7071 0 0.7071 0.9239 0 0.3827 1 0 1
  [3,16,0.7071,0,0.7071,0.9239,0,0.3827,1,0,1],
// 3 16 0.3827 0 0.9239 0.7071 0 0.7071 1 0 1
  [3,16,0.3827,0,0.9239,0.7071,0,0.7071,1,0,1],
// 3 16 0 0 1 0.3827 0 0.9239 1 0 1
  [3,16,0,0,1,0.3827,0,0.9239,1,0,1],
];
module ldraw_lib__1_4ndis(step=0, col=false, unit=2/5, alt=false, line=0.2, solid=!$preview)
    makepoly(ldraw_lib__1_4ndis(), step=step, col=col, unit=unit, alt=alt, line=line, solid=solid);
ldraw_lib__1_4ndis(line=0.2);
// file: ../p/1-4chrd.scad
use <../lib.scad>
$fa=1; $fs=0.2;
function ldraw_lib__1_4chrd(realsolid=false) = [
// 0 Chord 0.25
// 0 Name: 1-4chrd.dat
// 0 Author: Tony Hafner [hafhead]
// 0 !LDRAW_ORG Primitive UPDATE 2012-02
// 0 !LICENSE Licensed under CC BY 2.0 and CC BY 4.0 : see CAreadme.txt
// 
// 0 BFC CERTIFY CCW
  [0,"BFC","CERTIFY"],
  [0,"BFC","CCW"],
// 
// 0 !HISTORY 2004-04-22 [PTadmin] Official Update 2004-02
// 0 !HISTORY 2007-10-09 [PTadmin] Header formatted for Contributor Agreement
// 0 !HISTORY 2008-07-01 [PTadmin] Official Update 2008-01
// 0 !HISTORY 2012-08-02 [MMR1988] Re-creation with PrimGen2 and Rectifier
// 0 !HISTORY 2012-08-09 [PTadmin] Official Update 2012-02
// 
// 
// 4 16 0.9239 0 0.3827 0.3827 0 0.9239 0 0 1 1 0 0
  [4,16,0.9239,0,0.3827,0.3827,0,0.9239,0,0,1,1,0,0],
// 3 16 0.7071 0 0.7071 0.3827 0 0.9239 0.9239 0 0.3827
  [3,16,0.7071,0,0.7071,0.3827,0,0.9239,0.9239,0,0.3827],
];
module ldraw_lib__1_4chrd(step=0, col=false, unit=2/5, alt=false, line=0.2, solid=!$preview)
    makepoly(ldraw_lib__1_4chrd(solid), step=step, col=col, unit=unit, alt=alt, line=line, solid=solid);
ldraw_lib__1_4chrd(line=0.2);
// file: s/3004s01.scad
use <../../lib.scad>
use <../../p/box4t.scad>
use <../../p/box5.scad>
use <../../p/stud.scad>
use <../../p/stud3.scad>
$fa=1; $fs=0.2;
function ldraw_lib__s__3004s01(realsolid=false) = [
// 0 ~Brick  1 x  2 without Front Face
// 0 Name: s\3004s01.dat
// 0 Author: James Jessiman
// 0 !LDRAW_ORG Subpart UPDATE 2003-03
// 0 !LICENSE Licensed under CC BY 2.0 and CC BY 4.0 : see CAreadme.txt
// 
// 0 BFC CERTIFY CCW
  [0,"BFC","CERTIFY"],
  [0,"BFC","CCW"],
// 
// 0 !HISTORY 2003-09-07 [jriley] Subfiling, BFC
// 0 !HISTORY 2003-12-19 [PTadmin] Official Update 2003-03
// 0 !HISTORY 2007-08-29 [PTadmin] Header formatted for Contributor Agreement
// 0 !HISTORY 2008-07-01 [PTadmin] Official Update 2008-01
// 
// 
// 1 16 0 4 0 1 0 0 0 -5 0 0 0 1 stud3.dat
  [1,16,0,4,0,1,0,0,0,-5,0,0,0,1, ldraw_lib__stud3(realsolid)],
// 0 BFC INVERTNEXT
  [0,"BFC","INVERTNEXT"],
// 1 16 0 24 0 16 0 0 0 -20 0 0 0 6 box5.dat
  [1,16,0,24,0,16,0,0,0,-20,0,0,0,6, ldraw_lib__box5(realsolid)],
// 4 16 20 24 10 16 24 6 -16 24 6 -20 24 10
  [4,16,20,24,10,16,24,6,-16,24,6,-20,24,10],
// 4 16 -20 24 10 -16 24 6 -16 24 -6 -20 24 -10
  [4,16,-20,24,10,-16,24,6,-16,24,-6,-20,24,-10],
// 4 16 -20 24 -10 -16 24 -6 16 24 -6 20 24 -10
  [4,16,-20,24,-10,-16,24,-6,16,24,-6,20,24,-10],
// 4 16 20 24 -10 16 24 -6 16 24 6 20 24 10
  [4,16,20,24,-10,16,24,-6,16,24,6,20,24,10],
// 1 16 0 24 0 20 0 0 0 -24 0 0 0 10 box4t.dat
  [1,16,0,24,0,20,0,0,0,-24,0,0,0,10, ldraw_lib__box4t(realsolid)],
// 1 16 10 0 0 1 0 0 0 1 0 0 0 1 stud.dat
  [1,16,10,0,0,1,0,0,0,1,0,0,0,1, ldraw_lib__stud(realsolid)],
// 1 16 -10 0 0 1 0 0 0 1 0 0 0 1 stud.dat
  [1,16,-10,0,0,1,0,0,0,1,0,0,0,1, ldraw_lib__stud(realsolid)],
// 0
];
module ldraw_lib__s__3004s01(step=0, col=false, unit=2/5, alt=false, line=0.2, solid=!$preview)
    makepoly(ldraw_lib__s__3004s01(solid), step=step, col=col, unit=unit, alt=alt, line=line, solid=solid);
ldraw_lib__s__3004s01(line=0.2);
// file: 3004.scad
use <../lib.scad>
use <s/3004s01.scad>
function ldraw_lib__3004() = [
// 0 Brick  1 x  2
// 0 Name: 3004.dat
// 0 Author: James Jessiman
// 0 !LDRAW_ORG Part UPDATE 2022-05
// 0 !LICENSE Licensed under CC BY 2.0 and CC BY 4.0 : see CAreadme.txt
// 
// 0 BFC CERTIFY CCW
  [0,"BFC","CERTIFY"],
  [0,"BFC","CCW"],
// 
// 0 !HISTORY 2001-10-26 [PTadmin] Official Update 2001-01
// 0 !HISTORY 2002-05-07 {unknown} BFC Certification
// 0 !HISTORY 2002-06-11 [PTadmin] Official Update 2002-03
// 0 !HISTORY 2007-05-07 [PTadmin] Header formatted for Contributor Agreement
// 0 !HISTORY 2008-07-01 [PTadmin] Official Update 2008-01
// 0 !HISTORY 2022-08-04 [MagFors] Using subfile
// 0 !HISTORY 2022-09-15 [PTadmin] Official Update 2022-05
// 
// 
// 1 16 0 0 0 1 0 0 0 1 0 0 0 1 s\3004s01.dat
  [1,16,0,0,0,1,0,0,0,1,0,0,0,1, ldraw_lib__s__3004s01()],
// 4 16 -20 24 -10 20 24 -10 20 0 -10 -20 0 -10
  [4,16,-20,24,-10,20,24,-10,20,0,-10,-20,0,-10],
];
module ldraw_lib__3004(step=0, col=false, unit=2/5, alt=false, line=0.2, solid=!$preview)
    makepoly(ldraw_lib__3004(), step=step, col=col, unit=unit, alt=alt, line=line, solid=solid);
ldraw_lib__3004(line=0.2);
// file: 163555k.scad
use <../lib.scad>
use <163555j.scad>
function ldraw_lib__163555k() = [
// 0 Sticker  1.1 x  1.9 with Airport Direction Sign - Right
// 0 Name: 163555k.dat
// 0 Author: Takeshi Takahashi [RainbowDolphin]
// 0 !LDRAW_ORG Part UPDATE 2022-05
// 0 !LICENSE Licensed under CC BY 4.0 : see CAreadme.txt
// 
// 0 BFC CERTIFY CCW
  [0,"BFC","CERTIFY"],
  [0,"BFC","CCW"],
// 
// 0 !KEYWORDS Bricklink 6399stk01, Brickowl 458337, Monorail, Rebrickable 163555
// 0 !KEYWORDS set 6399, Station
// 
// 0 !HISTORY 2022-09-15 [PTadmin] Official Update 2022-05
// 
// 
// 1 16 0 0 0 -1 0 0 0 1 0 0 0 1 163555j.dat
  [1,16,0,0,0,-1,0,0,0,1,0,0,0,1, ldraw_lib__163555j()],
];
module ldraw_lib__163555k(step=0, col=false, unit=2/5, alt=false, line=0.2, solid=!$preview)
    makepoly(ldraw_lib__163555k(), step=step, col=col, unit=unit, alt=alt, line=line, solid=solid);
ldraw_lib__163555k(line=0.2);
// main file
use <../lib.scad>
use <163555k.scad>
use <3004.scad>
function ldraw_lib__3004d0y() = [
// 0 Brick  1 x  2 with Town Airport Direction Signs on White Background Right Sticker
// 0 Name: 3004d0y.dat
// 0 Author: Takeshi Takahashi [RainbowDolphin]
// 0 !LDRAW_ORG Shortcut UPDATE 2024-07
// 0 !LICENSE Licensed under CC BY 4.0 : see CAreadme.txt
// 
// 0 BFC CERTIFY CCW
  [0,"BFC","CERTIFY"],
  [0,"BFC","CCW"],
// 
// 0 !CATEGORY Sticker Shortcut
// 0 !KEYWORDS Airport Shuttle, Bricklink 3004pb017L, Monorail, set 6399, Station
// 
// 0 !HISTORY 2024-08-26 [OrionP] Official Update 2024-07
// 
// 1 16 0 0 0 1 0 0 0 1 0 0 0 1 3004.dat
  [1,16,0,0,0,1,0,0,0,1,0,0,0,1, ldraw_lib__3004()],
// 1 16 0 12 -10 1 0 0 0 0 -1 0 1 0 163555k.dat
  [1,16,0,12,-10,1,0,0,0,0,-1,0,1,0, ldraw_lib__163555k()],
];
module ldraw_lib__3004d0y(step=0, col=false, unit=2/5, alt=false, line=0.2, solid=!$preview)
    makepoly(ldraw_lib__3004d0y(), step=step, col=col, unit=unit, alt=alt, line=line, solid=solid);
ldraw_lib__3004d0y(line=0.2);
